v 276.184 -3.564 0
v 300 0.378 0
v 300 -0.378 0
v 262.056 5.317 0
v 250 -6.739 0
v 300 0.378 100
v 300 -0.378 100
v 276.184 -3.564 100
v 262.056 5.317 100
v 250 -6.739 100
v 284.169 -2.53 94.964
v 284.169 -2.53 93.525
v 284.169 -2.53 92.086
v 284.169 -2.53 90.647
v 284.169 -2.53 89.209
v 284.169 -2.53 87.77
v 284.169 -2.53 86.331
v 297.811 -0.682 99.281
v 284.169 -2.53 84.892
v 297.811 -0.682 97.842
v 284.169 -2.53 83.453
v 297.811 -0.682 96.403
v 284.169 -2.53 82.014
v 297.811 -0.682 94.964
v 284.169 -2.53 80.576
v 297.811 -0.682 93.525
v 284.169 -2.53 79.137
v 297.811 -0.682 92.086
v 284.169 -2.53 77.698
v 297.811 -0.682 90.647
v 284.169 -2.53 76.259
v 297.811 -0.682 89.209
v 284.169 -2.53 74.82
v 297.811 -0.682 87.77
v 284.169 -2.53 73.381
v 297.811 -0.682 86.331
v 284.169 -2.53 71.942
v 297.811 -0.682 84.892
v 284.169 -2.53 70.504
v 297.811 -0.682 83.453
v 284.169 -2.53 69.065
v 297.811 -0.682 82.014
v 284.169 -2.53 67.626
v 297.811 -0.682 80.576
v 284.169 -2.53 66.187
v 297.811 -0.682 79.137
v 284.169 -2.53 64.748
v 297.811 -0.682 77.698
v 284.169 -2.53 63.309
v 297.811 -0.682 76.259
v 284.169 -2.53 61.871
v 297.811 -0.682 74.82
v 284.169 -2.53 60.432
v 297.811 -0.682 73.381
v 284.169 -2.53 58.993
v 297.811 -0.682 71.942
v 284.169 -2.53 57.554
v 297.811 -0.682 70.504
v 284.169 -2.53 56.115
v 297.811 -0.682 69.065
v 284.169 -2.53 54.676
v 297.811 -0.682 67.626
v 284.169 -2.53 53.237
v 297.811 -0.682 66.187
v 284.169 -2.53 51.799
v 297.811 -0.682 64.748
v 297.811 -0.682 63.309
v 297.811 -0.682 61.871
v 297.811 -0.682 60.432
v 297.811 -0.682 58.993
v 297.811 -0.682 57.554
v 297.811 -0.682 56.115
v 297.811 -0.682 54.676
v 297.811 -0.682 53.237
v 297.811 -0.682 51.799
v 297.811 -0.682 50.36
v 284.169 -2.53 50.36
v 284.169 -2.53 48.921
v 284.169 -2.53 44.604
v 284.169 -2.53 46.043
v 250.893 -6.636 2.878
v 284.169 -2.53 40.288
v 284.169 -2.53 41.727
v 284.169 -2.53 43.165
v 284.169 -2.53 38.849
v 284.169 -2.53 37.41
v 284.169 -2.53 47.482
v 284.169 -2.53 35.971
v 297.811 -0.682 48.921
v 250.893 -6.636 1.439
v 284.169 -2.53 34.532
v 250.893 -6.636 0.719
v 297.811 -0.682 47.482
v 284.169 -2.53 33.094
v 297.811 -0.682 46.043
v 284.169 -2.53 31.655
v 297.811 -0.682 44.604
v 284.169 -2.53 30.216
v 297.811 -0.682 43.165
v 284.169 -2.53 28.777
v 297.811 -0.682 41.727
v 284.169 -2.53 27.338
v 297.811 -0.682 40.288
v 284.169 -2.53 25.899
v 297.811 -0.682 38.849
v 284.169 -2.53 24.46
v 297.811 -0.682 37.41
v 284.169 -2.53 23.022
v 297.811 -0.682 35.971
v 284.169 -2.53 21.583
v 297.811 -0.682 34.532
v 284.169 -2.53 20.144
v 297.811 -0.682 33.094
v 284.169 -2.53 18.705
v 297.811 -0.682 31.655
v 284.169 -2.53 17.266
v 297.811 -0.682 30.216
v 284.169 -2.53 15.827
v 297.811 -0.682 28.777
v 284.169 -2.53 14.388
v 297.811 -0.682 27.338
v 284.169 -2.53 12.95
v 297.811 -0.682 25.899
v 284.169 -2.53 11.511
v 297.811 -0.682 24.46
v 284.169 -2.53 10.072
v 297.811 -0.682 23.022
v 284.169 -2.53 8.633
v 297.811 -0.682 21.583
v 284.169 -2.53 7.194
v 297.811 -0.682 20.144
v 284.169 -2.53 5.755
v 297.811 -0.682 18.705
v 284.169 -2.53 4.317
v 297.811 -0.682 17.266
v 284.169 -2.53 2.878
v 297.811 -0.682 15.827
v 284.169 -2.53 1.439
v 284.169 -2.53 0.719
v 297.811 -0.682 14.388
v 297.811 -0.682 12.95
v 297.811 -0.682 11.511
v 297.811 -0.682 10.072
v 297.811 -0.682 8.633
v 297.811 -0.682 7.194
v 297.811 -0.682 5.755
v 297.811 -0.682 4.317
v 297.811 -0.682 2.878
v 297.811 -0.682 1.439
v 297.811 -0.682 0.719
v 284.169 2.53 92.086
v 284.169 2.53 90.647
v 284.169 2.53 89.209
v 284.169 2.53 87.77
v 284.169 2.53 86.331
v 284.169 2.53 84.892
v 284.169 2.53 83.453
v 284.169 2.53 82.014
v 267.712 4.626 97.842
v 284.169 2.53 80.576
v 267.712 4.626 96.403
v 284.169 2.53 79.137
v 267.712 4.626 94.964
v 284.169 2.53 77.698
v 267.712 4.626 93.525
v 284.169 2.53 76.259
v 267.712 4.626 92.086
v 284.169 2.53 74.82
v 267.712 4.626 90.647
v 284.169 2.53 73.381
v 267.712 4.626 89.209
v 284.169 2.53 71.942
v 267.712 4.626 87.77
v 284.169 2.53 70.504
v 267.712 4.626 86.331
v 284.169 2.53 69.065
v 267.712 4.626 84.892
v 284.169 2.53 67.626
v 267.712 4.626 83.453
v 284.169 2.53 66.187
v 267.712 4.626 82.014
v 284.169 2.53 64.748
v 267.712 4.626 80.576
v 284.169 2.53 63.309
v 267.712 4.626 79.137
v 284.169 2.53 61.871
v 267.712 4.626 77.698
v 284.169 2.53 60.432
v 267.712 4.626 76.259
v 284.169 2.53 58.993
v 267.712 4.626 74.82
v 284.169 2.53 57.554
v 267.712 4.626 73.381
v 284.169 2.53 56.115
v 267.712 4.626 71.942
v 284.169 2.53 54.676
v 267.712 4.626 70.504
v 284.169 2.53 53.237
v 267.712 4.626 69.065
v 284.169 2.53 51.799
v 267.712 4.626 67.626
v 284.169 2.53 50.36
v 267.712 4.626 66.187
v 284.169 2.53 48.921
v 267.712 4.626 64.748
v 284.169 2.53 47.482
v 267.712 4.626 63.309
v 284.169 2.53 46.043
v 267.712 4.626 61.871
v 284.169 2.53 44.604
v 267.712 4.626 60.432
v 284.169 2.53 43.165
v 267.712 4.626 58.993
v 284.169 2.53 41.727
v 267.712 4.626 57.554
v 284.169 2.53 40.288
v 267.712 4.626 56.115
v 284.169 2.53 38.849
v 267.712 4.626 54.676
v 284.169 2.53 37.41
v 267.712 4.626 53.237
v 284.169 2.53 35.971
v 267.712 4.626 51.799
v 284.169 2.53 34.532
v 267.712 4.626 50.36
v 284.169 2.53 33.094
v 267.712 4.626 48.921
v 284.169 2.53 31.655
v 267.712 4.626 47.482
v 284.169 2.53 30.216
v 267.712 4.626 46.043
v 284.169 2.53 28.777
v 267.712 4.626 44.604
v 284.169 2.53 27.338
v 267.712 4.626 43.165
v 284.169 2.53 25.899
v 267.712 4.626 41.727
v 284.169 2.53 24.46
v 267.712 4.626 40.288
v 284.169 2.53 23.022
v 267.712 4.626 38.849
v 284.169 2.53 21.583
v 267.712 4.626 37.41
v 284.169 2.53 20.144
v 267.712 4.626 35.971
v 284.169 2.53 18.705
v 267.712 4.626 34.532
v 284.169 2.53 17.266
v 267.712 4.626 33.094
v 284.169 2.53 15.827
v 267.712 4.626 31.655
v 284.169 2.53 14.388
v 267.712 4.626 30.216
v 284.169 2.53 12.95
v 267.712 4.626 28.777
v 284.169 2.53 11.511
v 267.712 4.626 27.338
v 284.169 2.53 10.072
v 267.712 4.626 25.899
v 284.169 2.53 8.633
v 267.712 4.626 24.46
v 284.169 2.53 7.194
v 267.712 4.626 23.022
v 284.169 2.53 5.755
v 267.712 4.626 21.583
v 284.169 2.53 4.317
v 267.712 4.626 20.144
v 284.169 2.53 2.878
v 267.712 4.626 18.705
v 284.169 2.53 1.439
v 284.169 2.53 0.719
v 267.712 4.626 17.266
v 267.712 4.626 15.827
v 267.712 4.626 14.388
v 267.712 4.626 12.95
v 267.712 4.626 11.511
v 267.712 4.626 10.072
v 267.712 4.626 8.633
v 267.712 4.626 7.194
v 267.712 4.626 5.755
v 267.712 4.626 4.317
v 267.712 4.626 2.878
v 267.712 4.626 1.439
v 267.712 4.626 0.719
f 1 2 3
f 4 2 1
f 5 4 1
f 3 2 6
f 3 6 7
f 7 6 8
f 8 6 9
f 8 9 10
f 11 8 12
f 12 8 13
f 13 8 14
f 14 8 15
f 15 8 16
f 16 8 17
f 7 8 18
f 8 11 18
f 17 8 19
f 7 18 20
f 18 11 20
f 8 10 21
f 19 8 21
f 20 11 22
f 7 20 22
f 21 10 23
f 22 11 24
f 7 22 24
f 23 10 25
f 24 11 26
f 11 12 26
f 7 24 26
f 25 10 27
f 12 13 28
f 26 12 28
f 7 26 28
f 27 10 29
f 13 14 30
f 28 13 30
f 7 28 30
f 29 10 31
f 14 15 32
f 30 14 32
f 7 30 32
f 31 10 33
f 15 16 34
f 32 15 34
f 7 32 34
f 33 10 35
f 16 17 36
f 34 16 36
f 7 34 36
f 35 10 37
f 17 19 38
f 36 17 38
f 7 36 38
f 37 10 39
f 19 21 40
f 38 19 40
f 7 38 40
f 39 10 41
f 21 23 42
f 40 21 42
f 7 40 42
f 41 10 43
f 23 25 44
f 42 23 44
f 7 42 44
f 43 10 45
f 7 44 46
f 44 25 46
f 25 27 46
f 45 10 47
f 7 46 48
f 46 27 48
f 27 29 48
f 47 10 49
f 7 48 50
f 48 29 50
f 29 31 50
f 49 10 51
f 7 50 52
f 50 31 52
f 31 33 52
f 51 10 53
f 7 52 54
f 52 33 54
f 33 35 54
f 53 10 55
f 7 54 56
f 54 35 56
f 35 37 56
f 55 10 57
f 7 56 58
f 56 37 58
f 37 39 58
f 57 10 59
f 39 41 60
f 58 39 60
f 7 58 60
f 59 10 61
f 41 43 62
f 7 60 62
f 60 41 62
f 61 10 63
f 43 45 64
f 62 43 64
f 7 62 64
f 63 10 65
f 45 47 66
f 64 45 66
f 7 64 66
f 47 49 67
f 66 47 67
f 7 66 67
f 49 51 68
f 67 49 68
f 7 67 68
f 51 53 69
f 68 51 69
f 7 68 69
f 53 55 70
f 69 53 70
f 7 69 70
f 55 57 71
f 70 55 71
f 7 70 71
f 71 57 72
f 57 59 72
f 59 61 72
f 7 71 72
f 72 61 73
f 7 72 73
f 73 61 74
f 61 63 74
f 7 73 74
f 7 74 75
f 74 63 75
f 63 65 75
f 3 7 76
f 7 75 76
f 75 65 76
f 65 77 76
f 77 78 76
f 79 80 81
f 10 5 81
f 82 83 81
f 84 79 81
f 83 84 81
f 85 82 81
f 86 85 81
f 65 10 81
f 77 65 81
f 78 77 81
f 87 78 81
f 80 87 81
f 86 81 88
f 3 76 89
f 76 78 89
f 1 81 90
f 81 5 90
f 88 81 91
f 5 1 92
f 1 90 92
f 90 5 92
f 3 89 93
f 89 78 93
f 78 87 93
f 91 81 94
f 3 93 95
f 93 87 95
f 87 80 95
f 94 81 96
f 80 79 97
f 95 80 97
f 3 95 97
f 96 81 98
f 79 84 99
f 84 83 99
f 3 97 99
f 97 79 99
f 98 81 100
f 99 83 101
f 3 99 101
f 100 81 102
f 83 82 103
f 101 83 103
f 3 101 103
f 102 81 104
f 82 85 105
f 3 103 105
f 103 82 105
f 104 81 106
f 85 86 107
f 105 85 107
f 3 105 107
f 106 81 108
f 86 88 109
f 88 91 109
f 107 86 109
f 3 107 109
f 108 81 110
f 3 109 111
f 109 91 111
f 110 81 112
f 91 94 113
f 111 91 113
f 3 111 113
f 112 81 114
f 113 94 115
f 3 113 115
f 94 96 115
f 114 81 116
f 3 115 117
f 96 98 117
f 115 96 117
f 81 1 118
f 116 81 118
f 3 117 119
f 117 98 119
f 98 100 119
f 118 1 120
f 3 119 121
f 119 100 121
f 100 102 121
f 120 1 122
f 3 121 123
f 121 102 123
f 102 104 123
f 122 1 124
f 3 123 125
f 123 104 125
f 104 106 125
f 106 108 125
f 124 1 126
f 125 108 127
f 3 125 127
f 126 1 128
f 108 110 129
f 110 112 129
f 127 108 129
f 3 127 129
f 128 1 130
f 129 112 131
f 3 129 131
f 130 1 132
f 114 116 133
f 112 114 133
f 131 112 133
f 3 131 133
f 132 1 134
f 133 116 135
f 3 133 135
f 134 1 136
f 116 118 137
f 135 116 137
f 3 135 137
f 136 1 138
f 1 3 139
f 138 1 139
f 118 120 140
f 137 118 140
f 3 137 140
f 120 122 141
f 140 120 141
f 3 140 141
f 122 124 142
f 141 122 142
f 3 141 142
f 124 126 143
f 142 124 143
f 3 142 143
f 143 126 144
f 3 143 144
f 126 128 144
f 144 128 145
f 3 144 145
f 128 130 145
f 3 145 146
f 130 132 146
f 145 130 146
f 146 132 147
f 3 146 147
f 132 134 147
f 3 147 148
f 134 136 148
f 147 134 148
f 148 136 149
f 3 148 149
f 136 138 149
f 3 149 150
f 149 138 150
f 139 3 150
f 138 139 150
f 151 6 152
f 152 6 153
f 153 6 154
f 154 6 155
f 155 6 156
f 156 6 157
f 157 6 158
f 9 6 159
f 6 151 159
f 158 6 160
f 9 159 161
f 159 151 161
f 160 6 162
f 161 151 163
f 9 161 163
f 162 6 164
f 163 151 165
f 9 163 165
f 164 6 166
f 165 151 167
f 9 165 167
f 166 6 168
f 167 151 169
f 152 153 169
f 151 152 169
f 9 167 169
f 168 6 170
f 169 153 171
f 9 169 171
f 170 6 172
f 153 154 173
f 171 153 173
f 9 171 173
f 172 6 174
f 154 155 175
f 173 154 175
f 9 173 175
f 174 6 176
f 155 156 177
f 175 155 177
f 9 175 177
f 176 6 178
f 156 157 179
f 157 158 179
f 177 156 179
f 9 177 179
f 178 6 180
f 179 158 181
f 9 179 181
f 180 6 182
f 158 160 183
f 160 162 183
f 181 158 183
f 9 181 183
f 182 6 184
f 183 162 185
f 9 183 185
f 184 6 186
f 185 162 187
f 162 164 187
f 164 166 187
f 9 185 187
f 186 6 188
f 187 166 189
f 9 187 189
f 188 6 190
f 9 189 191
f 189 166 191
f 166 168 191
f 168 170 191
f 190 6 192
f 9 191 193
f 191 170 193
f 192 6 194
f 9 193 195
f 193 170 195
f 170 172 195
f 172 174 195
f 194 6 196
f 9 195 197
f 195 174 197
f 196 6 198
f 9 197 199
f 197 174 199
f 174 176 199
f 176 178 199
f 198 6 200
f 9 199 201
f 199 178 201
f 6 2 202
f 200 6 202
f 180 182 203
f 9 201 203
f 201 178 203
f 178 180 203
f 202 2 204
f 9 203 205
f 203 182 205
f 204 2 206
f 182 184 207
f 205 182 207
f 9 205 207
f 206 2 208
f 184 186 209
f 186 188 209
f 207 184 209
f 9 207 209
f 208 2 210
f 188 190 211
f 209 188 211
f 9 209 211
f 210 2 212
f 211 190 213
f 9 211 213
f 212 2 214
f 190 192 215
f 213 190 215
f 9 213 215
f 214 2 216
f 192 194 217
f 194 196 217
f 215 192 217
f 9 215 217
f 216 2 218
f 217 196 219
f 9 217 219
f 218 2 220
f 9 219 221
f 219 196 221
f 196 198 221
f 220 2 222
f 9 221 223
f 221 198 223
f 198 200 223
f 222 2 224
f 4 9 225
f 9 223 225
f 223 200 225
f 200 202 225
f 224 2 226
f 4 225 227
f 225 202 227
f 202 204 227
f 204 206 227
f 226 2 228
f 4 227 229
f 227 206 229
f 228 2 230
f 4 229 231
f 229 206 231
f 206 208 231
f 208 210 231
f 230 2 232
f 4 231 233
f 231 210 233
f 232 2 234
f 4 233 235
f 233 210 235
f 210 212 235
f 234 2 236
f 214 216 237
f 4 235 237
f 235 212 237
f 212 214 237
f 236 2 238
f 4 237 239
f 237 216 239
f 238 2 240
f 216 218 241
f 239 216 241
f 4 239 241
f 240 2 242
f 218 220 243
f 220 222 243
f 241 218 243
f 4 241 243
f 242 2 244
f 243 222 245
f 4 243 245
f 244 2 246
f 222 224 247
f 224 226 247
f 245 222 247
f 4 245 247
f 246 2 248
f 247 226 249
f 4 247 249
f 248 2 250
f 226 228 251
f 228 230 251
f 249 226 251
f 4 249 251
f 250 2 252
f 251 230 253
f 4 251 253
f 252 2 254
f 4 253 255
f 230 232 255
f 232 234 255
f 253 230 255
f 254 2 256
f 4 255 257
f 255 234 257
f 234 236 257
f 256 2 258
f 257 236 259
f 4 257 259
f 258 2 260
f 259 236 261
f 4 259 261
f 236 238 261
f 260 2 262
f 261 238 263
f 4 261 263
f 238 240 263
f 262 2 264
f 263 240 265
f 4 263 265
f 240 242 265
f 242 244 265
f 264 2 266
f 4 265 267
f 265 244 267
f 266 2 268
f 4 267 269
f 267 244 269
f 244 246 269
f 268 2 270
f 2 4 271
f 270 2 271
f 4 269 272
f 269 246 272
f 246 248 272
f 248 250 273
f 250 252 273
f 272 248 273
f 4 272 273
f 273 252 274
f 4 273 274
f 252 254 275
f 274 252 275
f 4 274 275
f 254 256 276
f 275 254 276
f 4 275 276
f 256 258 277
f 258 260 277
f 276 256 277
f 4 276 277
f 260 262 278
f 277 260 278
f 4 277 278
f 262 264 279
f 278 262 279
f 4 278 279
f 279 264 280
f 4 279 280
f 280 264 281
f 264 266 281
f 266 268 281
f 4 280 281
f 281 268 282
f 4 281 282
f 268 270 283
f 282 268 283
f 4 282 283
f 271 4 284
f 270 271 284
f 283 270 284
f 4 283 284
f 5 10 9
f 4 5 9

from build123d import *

# Parameters (mm, degrees)
BOSS_EXTRUDE1_DEPTH     = 100
CUT_EXTRUDE8_DEPTH      = 317.739843694
CUT_EXTRUDE8_DEPTH_BACK = 317.739843694
SKETCH9_OUTSIDE_W       = 365.654
SKETCH9_OUTSIDE_H       = 165.654
SKETCH9_OUTSIDE_W_2     = 50
SKETCH9_OUTSIDE_H_2     = 100
CUT_EXTRUDE9_DEPTH      = 317.299560542


with BuildPart() as part:
    # Sketch5 → Boss-Extrude1 (new body)
    with BuildSketch(Plane.XY):
        with BuildLine():
            Line((300, 0.378), (300, -0.378))
            add(Edge.make_bspline(
                [(300, 0.378), (299.270406424, 0.479445822), (297.234667094, 0.762503754), (293.659650161, 1.257673506), (289.112411795, 1.874242443), (284.080816659, 2.54451744), (278.752044218, 3.238122316), (273.265899022, 3.934946436), (267.705955472, 4.629019943), (262.11456302, 5.313069107), (256.508348909, 5.982191812), (250.891738994, 6.637990809), (245.269556965, 7.281779235), (239.647345349, 7.912232764), (234.025130107, 8.526992046), (228.399087903, 9.126229764), (222.768257645, 9.713077606), (217.135920793, 10.28745981), (211.505410154, 10.846941084), (205.877619803, 11.391642827), (200.251512374, 11.920884624), (194.626420536, 12.434617078), (189.002797137, 12.931911809), (183.381530938, 13.413097581), (177.763225616, 13.876376701), (172.148301533, 14.321237194), (166.537529462, 14.747820918), (160.931736194, 15.154228144), (155.33170885, 15.539100856), (149.737538345, 15.902649564), (144.148688279, 16.241846119), (138.565679604, 16.557420546), (132.990859803, 16.847397555), (127.42743944, 17.110211679), (121.877619637, 17.343891718), (116.340758577, 17.545256813), (110.815476382, 17.71267912), (105.301273398, 17.844497938), (99.800570116, 17.940091813), (94.317435844, 17.996590439), (88.855764067, 18.010124458), (83.418647975, 17.97923384), (78.008480827, 17.899160713), (72.628455365, 17.767033787), (67.282738746, 17.579413934), (61.977364895, 17.331515489), (56.720691016, 17.021032651), (51.525175322, 16.64095807), (46.408202619, 16.190188591), (41.394176065, 15.661669099), (36.515671087, 15.053963784), (31.819009441, 14.365623605), (27.366164829, 13.603475684), (23.235217954, 12.782583444), (19.502642451, 11.920250751), (16.218271393, 11.044597796), (13.389186016, 10.175076255), (10.984929333, 9.333498715), (8.961561478, 8.522062882), (7.267292053, 7.746976002), (5.846052466, 7.010625622), (4.647711085, 6.300634033), (3.628235251, 5.606513668), (2.751909197, 4.926635252), (2.00625736, 4.249917259), (1.390586137, 3.570259492), (0.901000435, 2.890942252), (0.529275535, 2.220219273), (0.260479537, 1.566458936), (0.085712654, 0.931035928), (-0.003509247, 0.308981015), (-0.003509247, -0.308981015), (0.085712654, -0.931035928), (0.260479537, -1.566458936), (0.529275535, -2.220219273), (0.901000435, -2.890942252), (1.390586137, -3.570259492), (2.00625736, -4.249917259), (2.751909197, -4.926635252), (3.628235251, -5.606513668), (4.647711085, -6.300634033), (5.846052466, -7.010625622), (7.267292053, -7.746975999), (8.961561475, -8.522062895), (10.984929344, -9.333498651), (13.389185965, -10.175076559), (16.21827163, -11.044596377), (19.502641361, -11.92025728), (23.235222799, -12.782554413), (27.366127559, -13.603596161), (31.819075008, -14.365113363), (36.515634637, -15.054106097), (41.394182204, -15.661628887), (46.408200924, -16.190199694), (51.525175786, -16.640955027), (56.720690889, -17.02103348), (61.977364929, -17.331515263), (67.282738736, -17.579413995), (72.628455367, -17.767033771), (78.008480826, -17.899160717), (83.418647975, -17.979233839), (88.855764067, -18.010124458), (94.317435844, -17.996590438), (99.800570116, -17.940091813), (105.301273398, -17.844497938), (110.815476382, -17.71267912), (116.340758577, -17.545256813), (121.877619637, -17.343891718), (127.42743944, -17.110211679), (132.990859803, -16.847397555), (138.565679604, -16.557420546), (144.148688279, -16.241846119), (149.737538345, -15.902649564), (155.33170885, -15.539100856), (160.931736194, -15.154228144), (166.537529462, -14.747820918), (172.148301533, -14.321237194), (177.763225616, -13.876376701), (183.381530938, -13.413097581), (189.002797137, -12.931911809), (194.626420536, -12.434617078), (200.251512374, -11.920884624), (205.877619803, -11.391642827), (211.505410154, -10.846941084), (217.135920793, -10.28745981), (222.768257645, -9.713077606), (228.399087903, -9.126229764), (234.025130107, -8.526992046), (239.647345349, -7.912232764), (245.269556965, -7.281779235), (250.891738994, -6.637990809), (256.508348909, -5.982191812), (262.11456302, -5.313069107), (267.705955472, -4.629019943), (273.265899022, -3.934946436), (278.752044218, -3.238122316), (284.080816659, -2.54451744), (289.112411795, -1.874242443), (293.659650161, -1.257673506), (297.234667094, -0.762503754), (299.270406424, -0.479445822), (300, -0.378)],
                knots=[0, 0, 0, 0, 0.003612221, 0.010078953, 0.017698618, 0.026115111, 0.034970966, 0.04405038, 0.05323433, 0.06244757, 0.071673993, 0.080921319, 0.090177538, 0.099424342, 0.108664441, 0.117912199, 0.127169502, 0.136426595, 0.145675426, 0.154916495, 0.164153237, 0.173386649, 0.182615736, 0.191838089, 0.201053134, 0.210260393, 0.219458942, 0.228646747, 0.237822316, 0.246985224, 0.256137384, 0.265279416, 0.27440695, 0.283512193, 0.292591781, 0.301646285, 0.310681793, 0.319699068, 0.32869452, 0.33766016, 0.346588583, 0.355477412, 0.364322937, 0.373121614, 0.381867635, 0.390553005, 0.399166026, 0.407689628, 0.416098119, 0.424354887, 0.432412429, 0.440204728, 0.447630505, 0.454563638, 0.460855379, 0.466413319, 0.47122861, 0.475365774, 0.47890126, 0.481915077, 0.484498872, 0.486747127, 0.488741252, 0.490543179, 0.492182104, 0.493672831, 0.495031908, 0.49627906, 0.497424737, 0.498490166, 0.499502758, 0.500497254, 0.501509846, 0.502575275, 0.503720952, 0.504968104, 0.506327181, 0.507817908, 0.509456832, 0.51125876, 0.513252884, 0.51550114, 0.518084934, 0.521098752, 0.524634237, 0.528771401, 0.533586692, 0.539144632, 0.545436374, 0.552369506, 0.5597952, 0.567587571, 0.575645113, 0.583901881, 0.592310372, 0.600833974, 0.609446995, 0.618132365, 0.626878386, 0.635677063, 0.644522588, 0.653411417, 0.66233984, 0.67130548, 0.680300932, 0.689318207, 0.698353715, 0.707408219, 0.716487807, 0.72559305, 0.734720584, 0.743862616, 0.753014776, 0.762177684, 0.771353253, 0.780541058, 0.789739607, 0.798946866, 0.808161911, 0.817384264, 0.826613351, 0.835846763, 0.845083505, 0.854324574, 0.863573405, 0.872830498, 0.882087801, 0.891335559, 0.900575658, 0.909822462, 0.919078681, 0.928326007, 0.93755243, 0.94676567, 0.95594962, 0.965029034, 0.973884889, 0.982301382, 0.989921047, 0.996387779, 1, 1, 1, 1], degree=3))
        make_face()
    extrude(amount=BOSS_EXTRUDE1_DEPTH)

    # Sketch9 outside → Cut-Extrude8 (cut, two sides: drawn at the far end of the back side and taken through both)
    with BuildSketch(Plane(origin=(0, 0, 0), x_dir=(1, 0, 0), z_dir=(0, 1, 0)).offset(-CUT_EXTRUDE8_DEPTH_BACK)):
        with Locations((150, -50)):
            Rectangle(SKETCH9_OUTSIDE_W, SKETCH9_OUTSIDE_H)
        with Locations((275, -50)):
            Rectangle(SKETCH9_OUTSIDE_W_2, SKETCH9_OUTSIDE_H_2, mode=Mode.SUBTRACT)
    extrude(amount=CUT_EXTRUDE8_DEPTH + CUT_EXTRUDE8_DEPTH_BACK, mode=Mode.SUBTRACT)

    # Sketch10 → Cut-Extrude9 (cut, through all)
    with BuildSketch(Plane.XY):
        Polygon((250, -6.738836522), (280, 23.261163478), (250, 23.261163478), align=None)
    extrude(amount=CUT_EXTRUDE9_DEPTH, mode=Mode.SUBTRACT)


solid = part.part
